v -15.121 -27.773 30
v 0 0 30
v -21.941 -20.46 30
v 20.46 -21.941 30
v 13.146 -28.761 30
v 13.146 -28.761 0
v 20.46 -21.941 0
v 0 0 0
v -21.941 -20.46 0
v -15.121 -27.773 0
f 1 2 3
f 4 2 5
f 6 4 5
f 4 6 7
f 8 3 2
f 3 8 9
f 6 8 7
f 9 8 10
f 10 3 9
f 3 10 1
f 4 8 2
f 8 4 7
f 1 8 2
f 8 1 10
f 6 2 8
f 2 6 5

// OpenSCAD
rotate([0,0,178])
rotate([0,-90,0]){
    difference(){
        rotate([-45,0,0]) {
            cube([30, 30, 30]);
        }
        scale([1,2,1]) {
            rotate([-45,0,0]) {
                cube([30, 30, 30]);
            }
        }
    }
}
